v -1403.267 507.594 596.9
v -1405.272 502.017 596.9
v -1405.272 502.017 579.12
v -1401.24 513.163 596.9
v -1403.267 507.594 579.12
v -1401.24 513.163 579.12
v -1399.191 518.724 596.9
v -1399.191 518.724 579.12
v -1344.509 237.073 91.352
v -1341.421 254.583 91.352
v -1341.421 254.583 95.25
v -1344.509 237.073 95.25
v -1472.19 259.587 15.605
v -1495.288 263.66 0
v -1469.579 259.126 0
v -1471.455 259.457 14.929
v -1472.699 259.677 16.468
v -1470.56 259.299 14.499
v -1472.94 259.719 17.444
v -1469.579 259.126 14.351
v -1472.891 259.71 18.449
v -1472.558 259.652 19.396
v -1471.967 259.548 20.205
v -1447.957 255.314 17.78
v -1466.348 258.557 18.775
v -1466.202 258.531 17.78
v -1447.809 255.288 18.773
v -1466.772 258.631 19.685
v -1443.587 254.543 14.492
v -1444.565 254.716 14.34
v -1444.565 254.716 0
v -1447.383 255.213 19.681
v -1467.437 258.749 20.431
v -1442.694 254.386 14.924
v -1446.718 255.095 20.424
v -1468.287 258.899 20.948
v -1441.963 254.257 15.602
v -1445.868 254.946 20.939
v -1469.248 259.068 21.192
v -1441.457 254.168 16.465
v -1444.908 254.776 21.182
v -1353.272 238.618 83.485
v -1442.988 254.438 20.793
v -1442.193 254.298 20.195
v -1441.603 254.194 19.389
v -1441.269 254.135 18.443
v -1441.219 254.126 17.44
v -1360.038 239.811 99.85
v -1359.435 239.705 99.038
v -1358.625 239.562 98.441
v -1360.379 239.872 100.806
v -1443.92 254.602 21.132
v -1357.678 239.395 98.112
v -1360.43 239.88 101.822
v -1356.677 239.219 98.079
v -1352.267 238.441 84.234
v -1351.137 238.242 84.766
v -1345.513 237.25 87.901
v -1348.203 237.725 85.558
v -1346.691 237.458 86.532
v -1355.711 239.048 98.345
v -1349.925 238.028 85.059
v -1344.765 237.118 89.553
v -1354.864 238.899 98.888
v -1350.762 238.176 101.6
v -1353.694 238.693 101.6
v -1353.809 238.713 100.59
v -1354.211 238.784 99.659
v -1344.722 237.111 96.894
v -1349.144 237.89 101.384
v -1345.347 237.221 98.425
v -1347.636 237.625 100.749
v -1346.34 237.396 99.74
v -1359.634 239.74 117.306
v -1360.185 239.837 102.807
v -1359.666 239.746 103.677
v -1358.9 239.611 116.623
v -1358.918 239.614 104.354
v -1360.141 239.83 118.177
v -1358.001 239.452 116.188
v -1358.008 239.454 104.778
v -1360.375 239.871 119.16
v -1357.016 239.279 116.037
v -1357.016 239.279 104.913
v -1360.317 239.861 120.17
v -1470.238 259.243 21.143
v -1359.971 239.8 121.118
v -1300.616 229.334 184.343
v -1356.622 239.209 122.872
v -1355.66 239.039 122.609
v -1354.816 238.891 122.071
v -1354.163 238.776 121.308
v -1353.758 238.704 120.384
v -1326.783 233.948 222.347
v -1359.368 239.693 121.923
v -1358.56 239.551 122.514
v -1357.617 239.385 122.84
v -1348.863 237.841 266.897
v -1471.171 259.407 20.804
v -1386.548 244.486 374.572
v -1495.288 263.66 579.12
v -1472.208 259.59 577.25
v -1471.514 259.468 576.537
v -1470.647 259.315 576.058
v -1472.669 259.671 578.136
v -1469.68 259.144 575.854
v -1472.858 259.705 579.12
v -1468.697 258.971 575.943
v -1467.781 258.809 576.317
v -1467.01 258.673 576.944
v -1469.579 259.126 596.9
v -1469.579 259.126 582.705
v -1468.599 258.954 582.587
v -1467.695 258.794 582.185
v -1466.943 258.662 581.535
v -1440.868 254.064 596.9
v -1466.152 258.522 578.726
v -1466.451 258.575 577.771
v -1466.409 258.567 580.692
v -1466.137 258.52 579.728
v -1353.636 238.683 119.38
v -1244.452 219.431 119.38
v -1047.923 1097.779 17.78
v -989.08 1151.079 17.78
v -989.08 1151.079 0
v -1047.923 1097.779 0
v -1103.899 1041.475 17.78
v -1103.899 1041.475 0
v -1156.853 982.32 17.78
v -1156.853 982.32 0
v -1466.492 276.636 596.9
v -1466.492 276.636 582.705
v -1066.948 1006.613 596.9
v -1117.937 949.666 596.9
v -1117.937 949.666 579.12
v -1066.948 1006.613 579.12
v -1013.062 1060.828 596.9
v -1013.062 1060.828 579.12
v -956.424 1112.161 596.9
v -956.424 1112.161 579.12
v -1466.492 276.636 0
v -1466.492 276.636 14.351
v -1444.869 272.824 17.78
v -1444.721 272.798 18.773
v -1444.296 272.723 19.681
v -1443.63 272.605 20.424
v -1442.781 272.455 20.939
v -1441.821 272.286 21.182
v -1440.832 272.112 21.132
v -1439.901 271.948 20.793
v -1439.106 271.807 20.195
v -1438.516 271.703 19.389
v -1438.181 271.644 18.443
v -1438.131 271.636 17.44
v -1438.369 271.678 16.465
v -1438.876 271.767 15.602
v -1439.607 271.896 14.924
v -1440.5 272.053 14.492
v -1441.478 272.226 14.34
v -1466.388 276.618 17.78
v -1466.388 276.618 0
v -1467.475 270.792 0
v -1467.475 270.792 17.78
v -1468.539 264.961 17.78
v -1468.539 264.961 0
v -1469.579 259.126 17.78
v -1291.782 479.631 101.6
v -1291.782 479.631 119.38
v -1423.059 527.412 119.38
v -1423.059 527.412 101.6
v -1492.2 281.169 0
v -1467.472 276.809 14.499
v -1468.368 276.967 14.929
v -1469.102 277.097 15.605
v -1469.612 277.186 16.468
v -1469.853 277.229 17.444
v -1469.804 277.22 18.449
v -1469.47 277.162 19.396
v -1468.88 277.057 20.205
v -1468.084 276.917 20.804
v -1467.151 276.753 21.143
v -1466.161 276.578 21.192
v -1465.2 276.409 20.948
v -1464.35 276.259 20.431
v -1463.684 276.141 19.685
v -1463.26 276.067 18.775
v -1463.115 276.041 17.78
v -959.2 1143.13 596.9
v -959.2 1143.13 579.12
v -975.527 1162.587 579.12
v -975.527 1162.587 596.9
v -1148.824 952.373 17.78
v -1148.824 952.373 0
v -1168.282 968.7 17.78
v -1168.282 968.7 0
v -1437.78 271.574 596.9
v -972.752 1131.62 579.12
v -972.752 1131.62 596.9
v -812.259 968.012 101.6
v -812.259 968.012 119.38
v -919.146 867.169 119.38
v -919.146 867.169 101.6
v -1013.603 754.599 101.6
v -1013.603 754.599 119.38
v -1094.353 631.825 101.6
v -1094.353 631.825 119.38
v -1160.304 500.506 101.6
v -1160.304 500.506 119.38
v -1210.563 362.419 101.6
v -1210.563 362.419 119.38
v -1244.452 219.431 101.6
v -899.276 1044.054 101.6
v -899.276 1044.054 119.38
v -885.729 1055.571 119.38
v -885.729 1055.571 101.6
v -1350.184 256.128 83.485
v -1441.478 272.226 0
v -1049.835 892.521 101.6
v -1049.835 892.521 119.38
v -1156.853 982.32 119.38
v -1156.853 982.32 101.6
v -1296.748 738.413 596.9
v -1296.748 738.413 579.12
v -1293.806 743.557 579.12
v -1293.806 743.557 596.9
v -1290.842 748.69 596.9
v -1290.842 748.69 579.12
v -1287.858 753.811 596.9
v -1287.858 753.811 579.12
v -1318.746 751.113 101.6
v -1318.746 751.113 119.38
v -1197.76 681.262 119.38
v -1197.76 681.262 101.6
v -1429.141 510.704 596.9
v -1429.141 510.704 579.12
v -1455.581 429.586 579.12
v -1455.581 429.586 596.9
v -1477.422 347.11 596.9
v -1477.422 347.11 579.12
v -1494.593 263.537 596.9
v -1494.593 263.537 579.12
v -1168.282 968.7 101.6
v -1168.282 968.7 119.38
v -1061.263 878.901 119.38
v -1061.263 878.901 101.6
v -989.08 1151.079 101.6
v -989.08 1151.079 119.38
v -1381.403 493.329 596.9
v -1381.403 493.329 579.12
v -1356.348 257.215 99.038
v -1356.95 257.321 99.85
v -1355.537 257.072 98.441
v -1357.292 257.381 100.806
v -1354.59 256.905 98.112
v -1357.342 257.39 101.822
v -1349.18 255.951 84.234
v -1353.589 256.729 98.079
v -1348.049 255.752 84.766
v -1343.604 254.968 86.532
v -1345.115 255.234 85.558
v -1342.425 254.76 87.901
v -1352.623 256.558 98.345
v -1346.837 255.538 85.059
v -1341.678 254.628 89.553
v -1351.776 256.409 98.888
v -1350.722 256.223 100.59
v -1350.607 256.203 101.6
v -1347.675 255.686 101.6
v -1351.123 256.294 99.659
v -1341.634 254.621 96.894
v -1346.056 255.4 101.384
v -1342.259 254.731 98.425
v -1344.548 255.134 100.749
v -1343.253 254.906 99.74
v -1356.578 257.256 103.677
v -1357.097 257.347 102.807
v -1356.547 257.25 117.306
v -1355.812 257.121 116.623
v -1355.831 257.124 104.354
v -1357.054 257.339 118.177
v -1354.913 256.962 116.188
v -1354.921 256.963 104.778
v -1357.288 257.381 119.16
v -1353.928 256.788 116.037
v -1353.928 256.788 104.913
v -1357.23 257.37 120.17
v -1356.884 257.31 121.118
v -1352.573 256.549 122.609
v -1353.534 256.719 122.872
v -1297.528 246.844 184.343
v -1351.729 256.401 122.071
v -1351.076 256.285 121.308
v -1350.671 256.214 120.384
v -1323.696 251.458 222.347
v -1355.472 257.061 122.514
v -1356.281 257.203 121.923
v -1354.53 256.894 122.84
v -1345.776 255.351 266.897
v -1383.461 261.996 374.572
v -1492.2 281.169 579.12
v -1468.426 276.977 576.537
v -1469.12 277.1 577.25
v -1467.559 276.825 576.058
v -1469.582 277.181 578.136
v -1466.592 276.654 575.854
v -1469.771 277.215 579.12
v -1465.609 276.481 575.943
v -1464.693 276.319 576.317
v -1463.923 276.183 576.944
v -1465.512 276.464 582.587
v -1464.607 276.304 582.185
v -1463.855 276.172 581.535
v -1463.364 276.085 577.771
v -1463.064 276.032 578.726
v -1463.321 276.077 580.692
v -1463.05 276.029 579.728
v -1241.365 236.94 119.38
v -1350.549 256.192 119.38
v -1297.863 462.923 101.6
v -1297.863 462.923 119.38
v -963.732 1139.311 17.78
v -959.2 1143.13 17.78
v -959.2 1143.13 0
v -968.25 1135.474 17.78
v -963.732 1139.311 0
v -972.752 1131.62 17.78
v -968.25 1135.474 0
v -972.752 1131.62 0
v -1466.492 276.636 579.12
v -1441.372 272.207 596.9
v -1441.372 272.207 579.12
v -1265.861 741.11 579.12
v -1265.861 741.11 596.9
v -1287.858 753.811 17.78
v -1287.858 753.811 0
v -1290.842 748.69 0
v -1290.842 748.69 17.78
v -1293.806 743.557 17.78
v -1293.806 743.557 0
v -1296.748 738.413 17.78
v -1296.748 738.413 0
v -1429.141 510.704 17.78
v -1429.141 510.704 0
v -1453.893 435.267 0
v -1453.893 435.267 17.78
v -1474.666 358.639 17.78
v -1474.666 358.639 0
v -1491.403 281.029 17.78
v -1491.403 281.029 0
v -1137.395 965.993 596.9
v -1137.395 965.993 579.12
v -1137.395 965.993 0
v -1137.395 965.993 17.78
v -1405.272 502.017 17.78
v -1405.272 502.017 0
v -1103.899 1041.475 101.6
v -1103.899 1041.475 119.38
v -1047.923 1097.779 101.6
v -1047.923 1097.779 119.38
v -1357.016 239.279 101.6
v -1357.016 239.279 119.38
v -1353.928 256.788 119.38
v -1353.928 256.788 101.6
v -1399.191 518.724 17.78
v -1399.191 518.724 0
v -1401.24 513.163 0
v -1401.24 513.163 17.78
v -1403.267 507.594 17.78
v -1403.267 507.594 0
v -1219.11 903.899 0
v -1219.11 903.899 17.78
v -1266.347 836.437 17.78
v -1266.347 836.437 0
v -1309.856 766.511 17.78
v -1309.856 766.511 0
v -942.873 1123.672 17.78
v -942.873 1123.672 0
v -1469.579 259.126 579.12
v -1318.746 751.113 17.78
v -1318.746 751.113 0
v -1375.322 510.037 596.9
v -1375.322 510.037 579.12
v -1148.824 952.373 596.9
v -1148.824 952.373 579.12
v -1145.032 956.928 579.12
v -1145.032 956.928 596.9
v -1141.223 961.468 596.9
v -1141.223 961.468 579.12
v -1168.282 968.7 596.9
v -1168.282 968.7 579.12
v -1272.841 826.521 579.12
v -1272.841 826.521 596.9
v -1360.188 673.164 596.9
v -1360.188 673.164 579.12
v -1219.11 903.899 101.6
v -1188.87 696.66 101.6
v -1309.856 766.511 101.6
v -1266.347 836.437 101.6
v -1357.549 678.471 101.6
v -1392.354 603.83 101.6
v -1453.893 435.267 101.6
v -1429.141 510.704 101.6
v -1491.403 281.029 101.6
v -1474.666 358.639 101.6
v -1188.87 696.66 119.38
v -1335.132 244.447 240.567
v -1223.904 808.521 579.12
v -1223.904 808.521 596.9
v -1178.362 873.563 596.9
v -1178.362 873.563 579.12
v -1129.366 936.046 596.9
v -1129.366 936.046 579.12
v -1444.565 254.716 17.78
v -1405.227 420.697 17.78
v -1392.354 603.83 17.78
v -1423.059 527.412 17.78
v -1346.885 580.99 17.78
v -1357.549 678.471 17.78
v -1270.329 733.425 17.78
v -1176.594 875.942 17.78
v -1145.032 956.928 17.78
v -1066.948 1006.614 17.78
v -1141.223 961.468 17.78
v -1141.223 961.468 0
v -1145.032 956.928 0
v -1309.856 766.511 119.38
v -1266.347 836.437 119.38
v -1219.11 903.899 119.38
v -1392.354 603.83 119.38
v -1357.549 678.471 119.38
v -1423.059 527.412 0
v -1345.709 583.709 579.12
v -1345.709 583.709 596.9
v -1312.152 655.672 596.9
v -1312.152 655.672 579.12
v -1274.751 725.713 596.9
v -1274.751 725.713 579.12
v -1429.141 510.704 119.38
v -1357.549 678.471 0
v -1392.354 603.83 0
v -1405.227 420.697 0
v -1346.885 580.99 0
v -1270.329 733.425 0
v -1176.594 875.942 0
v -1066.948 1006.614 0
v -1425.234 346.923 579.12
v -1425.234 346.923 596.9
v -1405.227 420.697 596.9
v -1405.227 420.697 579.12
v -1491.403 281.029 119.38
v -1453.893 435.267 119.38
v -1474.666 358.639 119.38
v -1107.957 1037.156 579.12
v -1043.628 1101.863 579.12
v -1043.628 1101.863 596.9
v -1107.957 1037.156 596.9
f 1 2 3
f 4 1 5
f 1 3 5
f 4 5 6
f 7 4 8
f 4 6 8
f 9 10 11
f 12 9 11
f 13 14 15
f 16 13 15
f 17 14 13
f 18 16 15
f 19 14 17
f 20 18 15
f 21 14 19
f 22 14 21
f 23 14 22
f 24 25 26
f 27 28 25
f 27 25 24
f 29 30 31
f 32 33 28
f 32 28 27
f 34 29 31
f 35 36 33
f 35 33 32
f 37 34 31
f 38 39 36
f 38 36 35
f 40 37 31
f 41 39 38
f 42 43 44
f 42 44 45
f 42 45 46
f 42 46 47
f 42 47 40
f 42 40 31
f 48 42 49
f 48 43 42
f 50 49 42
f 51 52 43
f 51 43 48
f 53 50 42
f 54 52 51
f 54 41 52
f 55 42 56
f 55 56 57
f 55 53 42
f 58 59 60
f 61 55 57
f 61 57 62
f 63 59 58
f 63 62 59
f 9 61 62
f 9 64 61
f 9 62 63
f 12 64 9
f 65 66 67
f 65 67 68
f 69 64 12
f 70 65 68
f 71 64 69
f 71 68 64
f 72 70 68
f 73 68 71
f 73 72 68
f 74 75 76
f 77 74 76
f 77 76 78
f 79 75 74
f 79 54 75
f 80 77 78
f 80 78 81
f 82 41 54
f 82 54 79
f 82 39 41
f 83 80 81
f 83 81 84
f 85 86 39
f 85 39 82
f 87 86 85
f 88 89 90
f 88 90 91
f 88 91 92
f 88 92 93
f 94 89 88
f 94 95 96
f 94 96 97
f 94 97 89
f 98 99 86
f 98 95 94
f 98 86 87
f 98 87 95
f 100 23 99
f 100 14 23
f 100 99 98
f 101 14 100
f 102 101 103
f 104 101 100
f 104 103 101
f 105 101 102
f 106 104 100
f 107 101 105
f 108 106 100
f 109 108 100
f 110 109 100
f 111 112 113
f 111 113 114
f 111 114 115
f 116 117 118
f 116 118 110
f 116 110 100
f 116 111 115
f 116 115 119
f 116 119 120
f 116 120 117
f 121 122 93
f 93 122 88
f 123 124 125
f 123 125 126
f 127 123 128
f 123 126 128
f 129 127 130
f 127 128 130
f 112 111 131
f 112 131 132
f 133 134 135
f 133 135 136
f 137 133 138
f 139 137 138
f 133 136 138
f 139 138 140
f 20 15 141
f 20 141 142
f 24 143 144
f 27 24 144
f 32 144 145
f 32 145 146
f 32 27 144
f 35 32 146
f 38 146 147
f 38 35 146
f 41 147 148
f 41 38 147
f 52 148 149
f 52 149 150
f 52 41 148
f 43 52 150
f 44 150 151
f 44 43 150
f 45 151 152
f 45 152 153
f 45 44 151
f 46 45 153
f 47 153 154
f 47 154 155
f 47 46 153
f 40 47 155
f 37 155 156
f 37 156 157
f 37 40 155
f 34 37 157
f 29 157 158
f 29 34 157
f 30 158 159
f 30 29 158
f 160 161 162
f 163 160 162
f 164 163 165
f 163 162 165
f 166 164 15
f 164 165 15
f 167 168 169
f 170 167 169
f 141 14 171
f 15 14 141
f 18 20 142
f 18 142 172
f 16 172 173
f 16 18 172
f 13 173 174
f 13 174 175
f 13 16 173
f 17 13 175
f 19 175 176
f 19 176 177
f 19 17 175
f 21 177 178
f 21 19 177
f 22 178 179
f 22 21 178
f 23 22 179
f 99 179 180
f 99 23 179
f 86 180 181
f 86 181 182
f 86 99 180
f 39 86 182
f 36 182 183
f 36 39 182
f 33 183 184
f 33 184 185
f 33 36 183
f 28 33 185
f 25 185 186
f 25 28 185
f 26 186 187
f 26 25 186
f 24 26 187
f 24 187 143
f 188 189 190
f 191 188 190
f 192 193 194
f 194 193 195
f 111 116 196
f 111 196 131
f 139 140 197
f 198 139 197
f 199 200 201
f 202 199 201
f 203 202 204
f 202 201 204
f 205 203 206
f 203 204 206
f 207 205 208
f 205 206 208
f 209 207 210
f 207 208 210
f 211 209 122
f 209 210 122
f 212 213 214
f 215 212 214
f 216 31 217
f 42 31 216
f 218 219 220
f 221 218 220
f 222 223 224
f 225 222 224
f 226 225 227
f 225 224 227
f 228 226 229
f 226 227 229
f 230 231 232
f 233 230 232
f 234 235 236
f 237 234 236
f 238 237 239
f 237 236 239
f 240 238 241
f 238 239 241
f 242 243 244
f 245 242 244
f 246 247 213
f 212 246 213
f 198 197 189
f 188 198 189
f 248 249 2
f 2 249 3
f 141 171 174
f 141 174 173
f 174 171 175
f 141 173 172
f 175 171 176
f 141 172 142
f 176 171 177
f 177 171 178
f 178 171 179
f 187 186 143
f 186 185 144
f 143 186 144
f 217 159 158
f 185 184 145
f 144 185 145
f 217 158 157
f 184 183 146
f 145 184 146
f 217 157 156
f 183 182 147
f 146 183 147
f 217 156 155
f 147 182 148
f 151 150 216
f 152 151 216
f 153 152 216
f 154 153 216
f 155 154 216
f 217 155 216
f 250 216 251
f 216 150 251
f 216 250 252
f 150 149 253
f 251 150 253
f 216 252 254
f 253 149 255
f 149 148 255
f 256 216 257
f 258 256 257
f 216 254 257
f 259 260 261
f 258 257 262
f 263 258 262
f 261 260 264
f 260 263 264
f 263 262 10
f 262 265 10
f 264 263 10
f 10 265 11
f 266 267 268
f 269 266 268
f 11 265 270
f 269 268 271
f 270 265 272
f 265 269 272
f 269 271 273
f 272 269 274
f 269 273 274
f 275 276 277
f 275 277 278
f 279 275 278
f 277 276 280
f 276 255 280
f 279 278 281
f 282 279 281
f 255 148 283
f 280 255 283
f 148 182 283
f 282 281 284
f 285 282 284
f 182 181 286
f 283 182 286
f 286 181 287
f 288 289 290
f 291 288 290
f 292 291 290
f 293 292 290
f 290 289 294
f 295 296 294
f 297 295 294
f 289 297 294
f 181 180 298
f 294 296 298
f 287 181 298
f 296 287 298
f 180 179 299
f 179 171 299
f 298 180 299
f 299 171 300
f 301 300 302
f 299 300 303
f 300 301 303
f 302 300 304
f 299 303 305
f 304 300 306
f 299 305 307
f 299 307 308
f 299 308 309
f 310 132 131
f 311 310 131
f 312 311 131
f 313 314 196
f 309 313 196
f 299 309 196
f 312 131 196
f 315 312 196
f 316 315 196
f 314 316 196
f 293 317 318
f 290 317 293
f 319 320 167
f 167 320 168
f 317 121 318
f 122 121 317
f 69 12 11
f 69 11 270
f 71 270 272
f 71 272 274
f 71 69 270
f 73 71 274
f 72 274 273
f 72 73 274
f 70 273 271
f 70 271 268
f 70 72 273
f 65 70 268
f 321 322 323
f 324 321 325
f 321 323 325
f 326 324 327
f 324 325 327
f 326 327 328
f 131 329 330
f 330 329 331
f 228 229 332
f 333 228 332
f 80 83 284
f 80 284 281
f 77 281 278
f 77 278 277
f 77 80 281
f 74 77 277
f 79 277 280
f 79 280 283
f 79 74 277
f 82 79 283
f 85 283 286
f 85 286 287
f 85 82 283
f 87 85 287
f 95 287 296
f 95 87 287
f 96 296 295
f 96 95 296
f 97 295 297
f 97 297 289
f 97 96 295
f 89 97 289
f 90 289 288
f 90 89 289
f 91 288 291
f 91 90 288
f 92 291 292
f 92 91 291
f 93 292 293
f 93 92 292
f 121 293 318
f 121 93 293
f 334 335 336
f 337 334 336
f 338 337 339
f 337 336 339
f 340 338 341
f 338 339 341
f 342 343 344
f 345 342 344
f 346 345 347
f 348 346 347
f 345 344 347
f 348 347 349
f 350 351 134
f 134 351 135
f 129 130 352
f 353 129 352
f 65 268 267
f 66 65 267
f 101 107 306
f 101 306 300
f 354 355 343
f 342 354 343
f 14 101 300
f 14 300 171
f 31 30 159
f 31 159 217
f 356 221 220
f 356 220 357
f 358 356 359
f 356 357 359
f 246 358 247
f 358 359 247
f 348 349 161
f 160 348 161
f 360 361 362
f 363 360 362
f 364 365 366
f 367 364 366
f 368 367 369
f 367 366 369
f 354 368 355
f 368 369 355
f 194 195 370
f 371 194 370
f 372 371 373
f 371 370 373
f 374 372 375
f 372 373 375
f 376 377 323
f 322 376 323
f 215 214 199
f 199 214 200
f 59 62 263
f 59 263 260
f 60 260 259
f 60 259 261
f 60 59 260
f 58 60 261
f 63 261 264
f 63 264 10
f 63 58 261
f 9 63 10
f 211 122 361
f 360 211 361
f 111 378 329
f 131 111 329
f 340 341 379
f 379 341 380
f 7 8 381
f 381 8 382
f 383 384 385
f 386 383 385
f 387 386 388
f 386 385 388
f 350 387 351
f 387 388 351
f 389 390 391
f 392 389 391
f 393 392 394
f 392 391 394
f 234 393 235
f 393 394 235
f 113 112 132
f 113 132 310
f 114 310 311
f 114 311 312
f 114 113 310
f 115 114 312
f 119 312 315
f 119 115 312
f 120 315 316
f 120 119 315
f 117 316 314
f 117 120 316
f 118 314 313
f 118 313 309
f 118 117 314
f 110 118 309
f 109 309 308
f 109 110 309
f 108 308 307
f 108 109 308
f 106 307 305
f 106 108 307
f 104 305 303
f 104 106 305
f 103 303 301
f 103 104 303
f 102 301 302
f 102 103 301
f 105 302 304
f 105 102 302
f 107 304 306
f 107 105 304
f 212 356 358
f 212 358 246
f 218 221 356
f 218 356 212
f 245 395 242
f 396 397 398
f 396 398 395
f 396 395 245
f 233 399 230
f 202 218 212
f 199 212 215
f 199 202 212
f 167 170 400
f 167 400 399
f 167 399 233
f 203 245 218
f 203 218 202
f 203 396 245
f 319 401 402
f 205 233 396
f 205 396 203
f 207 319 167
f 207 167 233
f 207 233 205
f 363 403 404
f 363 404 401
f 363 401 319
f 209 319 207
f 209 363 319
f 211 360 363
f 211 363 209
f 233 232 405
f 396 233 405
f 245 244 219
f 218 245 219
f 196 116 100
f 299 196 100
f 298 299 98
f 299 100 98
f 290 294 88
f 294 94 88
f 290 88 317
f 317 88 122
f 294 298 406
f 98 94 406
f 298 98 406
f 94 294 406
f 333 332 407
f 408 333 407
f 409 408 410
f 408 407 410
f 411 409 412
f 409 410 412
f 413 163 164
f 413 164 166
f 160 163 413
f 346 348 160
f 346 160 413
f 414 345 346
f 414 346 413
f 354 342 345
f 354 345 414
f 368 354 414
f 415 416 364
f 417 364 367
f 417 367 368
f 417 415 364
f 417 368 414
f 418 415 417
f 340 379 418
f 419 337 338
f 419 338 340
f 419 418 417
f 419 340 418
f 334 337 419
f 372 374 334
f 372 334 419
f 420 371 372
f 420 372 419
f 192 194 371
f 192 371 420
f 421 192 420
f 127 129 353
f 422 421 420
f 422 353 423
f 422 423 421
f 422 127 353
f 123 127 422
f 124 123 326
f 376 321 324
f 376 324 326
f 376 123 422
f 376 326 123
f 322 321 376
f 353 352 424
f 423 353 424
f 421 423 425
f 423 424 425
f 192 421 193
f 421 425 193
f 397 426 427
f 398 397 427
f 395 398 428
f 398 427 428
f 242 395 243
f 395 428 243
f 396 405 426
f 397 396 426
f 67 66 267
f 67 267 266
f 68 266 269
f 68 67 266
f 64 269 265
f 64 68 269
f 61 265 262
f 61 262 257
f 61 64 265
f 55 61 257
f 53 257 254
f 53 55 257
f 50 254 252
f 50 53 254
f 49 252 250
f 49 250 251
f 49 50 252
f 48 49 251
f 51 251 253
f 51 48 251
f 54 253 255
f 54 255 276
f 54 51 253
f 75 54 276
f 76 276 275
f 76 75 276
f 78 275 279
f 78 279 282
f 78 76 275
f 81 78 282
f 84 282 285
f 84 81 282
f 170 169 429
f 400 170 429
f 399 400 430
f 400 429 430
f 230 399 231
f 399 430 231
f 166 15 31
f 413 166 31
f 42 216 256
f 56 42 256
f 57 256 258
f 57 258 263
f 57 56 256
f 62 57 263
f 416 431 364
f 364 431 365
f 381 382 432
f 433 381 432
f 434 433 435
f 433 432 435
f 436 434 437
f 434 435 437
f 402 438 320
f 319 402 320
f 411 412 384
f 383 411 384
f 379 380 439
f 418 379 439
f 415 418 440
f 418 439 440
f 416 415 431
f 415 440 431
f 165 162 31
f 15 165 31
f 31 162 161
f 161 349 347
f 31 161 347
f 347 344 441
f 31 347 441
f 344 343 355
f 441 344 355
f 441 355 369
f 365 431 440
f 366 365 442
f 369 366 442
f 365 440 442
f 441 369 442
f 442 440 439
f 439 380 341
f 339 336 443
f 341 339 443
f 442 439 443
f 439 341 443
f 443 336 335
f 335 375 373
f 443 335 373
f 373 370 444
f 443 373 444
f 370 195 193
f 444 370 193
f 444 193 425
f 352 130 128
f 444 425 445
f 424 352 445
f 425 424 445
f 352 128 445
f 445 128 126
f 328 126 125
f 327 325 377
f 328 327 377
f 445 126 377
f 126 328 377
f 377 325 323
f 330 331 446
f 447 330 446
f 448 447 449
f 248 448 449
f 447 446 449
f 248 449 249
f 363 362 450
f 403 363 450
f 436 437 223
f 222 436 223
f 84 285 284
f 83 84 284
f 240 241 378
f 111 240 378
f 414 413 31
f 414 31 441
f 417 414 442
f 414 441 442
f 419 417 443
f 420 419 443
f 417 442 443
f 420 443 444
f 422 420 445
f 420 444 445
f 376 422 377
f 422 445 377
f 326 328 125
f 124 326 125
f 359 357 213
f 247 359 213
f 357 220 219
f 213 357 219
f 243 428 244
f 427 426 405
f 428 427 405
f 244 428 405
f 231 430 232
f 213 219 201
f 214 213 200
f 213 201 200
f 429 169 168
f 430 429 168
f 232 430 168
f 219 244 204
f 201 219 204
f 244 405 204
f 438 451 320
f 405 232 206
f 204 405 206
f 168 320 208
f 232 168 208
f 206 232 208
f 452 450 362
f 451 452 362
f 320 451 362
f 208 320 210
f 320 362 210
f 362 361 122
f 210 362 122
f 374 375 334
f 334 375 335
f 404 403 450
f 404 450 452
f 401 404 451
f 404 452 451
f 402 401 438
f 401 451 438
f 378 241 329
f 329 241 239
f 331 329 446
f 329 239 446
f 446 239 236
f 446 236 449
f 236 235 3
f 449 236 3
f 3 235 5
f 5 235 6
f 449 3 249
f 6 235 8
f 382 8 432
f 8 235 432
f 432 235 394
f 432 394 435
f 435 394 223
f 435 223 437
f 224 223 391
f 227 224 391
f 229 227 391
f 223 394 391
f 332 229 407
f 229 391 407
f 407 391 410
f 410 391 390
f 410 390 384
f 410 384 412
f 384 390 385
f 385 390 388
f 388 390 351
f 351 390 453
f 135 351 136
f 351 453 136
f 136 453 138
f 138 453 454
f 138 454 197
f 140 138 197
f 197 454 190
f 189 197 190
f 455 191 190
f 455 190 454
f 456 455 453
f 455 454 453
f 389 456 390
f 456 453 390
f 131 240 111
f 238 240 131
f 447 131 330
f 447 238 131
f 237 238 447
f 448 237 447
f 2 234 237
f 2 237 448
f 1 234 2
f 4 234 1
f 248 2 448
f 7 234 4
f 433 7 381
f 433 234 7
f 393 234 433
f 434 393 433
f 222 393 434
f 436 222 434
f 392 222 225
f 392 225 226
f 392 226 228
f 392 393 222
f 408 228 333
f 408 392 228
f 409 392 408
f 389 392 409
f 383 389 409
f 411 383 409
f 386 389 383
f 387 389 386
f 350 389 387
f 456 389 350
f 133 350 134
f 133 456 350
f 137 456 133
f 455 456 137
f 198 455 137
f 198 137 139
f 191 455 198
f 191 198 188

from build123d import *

# Parameters (mm, degrees)
F1_DEPTH = 17.78
F3_DEPTH = 17.78
F5_DEPTH = 17.78
F8_DEPTH = 17.78


with BuildPart() as f1:
    # F0 (on Top) → F1 (new body)
    with BuildSketch(Plane.XY):
        with BuildLine():
            Line((-942.8730052687, 1123.6722913891), (-959.1998105547, 1143.1298202443))
            ThreePointArc((-959.1998105547, 1143.1298202443), (-965.9930441933, 1137.395050574), (-972.7519920849, 1131.6199116288))
            Line((-972.7519920849, 1131.6199116288), (-989.0799370092, 1151.0787986519))
            ThreePointArc((-989.0799370092, 1151.0787986519), (-1076.2792142324, 1069.9927922707), (-1156.8530210759, 982.3200141133))
            Line((-1156.8530210759, 982.3200141133), (-1137.3951527054, 965.9929239401))
            ThreePointArc((-1137.3951527054, 965.9929239401), (-1143.1298202443, 959.1998105547), (-1148.8239164056, 952.3726537414))
            Line((-1148.8239164056, 952.3726537414), (-1168.2817847761, 968.6997439146))
            ThreePointArc((-1168.2817847761, 968.6997439146), (-1243.1861000152, 870.4882786282), (-1309.8559045877, 766.5109468995))
            Line((-1309.8559045877, 766.5109468995), (-1287.8584755041, 753.8107252966))
            ThreePointArc((-1287.8584755041, 753.8107252966), (-1292.3264087973, 746.125), (-1296.7484755041, 738.4127936173))
            Line((-1296.7484755041, 738.4127936173), (-1318.7459045877, 751.1130152202))
            ThreePointArc((-1318.7459045877, 751.1130152202), (-1375.4580129962, 641.3866049308), (-1423.0594792576, 527.4118324374))
            Line((-1423.0594792576, 527.4118324374), (-1399.1908702125, 518.7243692117))
            ThreePointArc((-1399.1908702125, 518.7243692117), (-1402.2563133678, 510.3795588777), (-1405.2719883608, 502.0166344141))
            Line((-1405.2719883608, 502.0166344141), (-1429.140597406, 510.7040976399))
            ThreePointArc((-1429.140597406, 510.7040976399), (-1464.7805470889, 397.088744955), (-1491.4034498948, 281.0289524975))
            Line((-1491.4034498948, 281.0289524975), (-1466.3875869413, 276.6179809131))
            ThreePointArc((-1466.3875869413, 276.6179809131), (-1468.0095300324, 267.8769908634), (-1469.5793694325, 259.1264931235))
            Line((-1469.5793694325, 259.1264931235), (-1444.565252506, 254.7158294107))
            ThreePointArc((-1444.565252506, 254.7158294107), (-1270.3293635412, 733.425), (-942.8730052687, 1123.6722913891))
        make_face()
    extrude(amount=F1_DEPTH)


with BuildPart() as f3:
    # F2 (on face) → F3 (new body)
    with BuildSketch(Plane(origin=(0, 0, 0), x_dir=(0.984807753, -0.1736481777, 0), z_dir=(-0.1736481777, -0.984807753, 0))):
        with BuildLine():
            Line((-1518.3551311493, 0), (-1492.25, 0))
            Line((-1492.25, 0), (-1492.25, 14.351))
            ThreePointArc((-1492.25, 14.351), (-1494.6746691527, 20.2046691527), (-1488.821, 17.78))
            Line((-1488.821, 17.78), (-1470.2938070244, 17.78))
            ThreePointArc((-1470.2938070244, 17.78), (-1464.4415489784, 20.1951790962), (-1466.85, 14.3401489527))
            Line((-1466.85, 14.3401489527), (-1466.85, 0))
            Line((-1466.85, 0), (-1374.1479773797, 83.4850971333))
            ThreePointArc((-1374.1479773797, 83.4850971333), (-1372.5673341992, 84.5284814934), (-1370.7492766555, 85.0592832973))
            ThreePointArc((-1370.7492766555, 85.0592832973), (-1366.8185465998, 87.1734978195), (-1365.25, 91.3520386391))
            Line((-1365.25, 91.3520386391), (-1365.25, 95.25))
            ThreePointArc((-1365.25, 95.25), (-1367.1098719395, 99.7401280605), (-1371.6, 101.6))
            Line((-1371.6, 101.6), (-1374.5770201141, 101.6))
            ThreePointArc((-1374.5770201141, 101.6), (-1380.4069192448, 99.0381939532), (-1377.95, 104.9130660301))
            Line((-1377.95, 104.9130660301), (-1377.95, 116.0374188485))
            ThreePointArc((-1377.95, 116.0374188485), (-1380.3385150421, 121.9228376163), (-1374.5181082663, 119.38))
            Line((-1374.5181082663, 119.38), (-1263.6500000001, 119.38))
            add(Edge.make_bspline(
                [(-1463.0953241153, 596.9), (-1435.2213655624, 463.1560709507), (-1371.53772684, 219.6405486266), (-1300.5032324543, 163.3910187016), (-1263.6500000001, 119.38)],
                knots=[0.0910439939, 0.0910439939, 0.0910439939, 0.0910439939, 0.6287928425, 1, 1, 1, 1], degree=3))
            Line((-1463.0953241153, 596.9), (-1492.25, 596.9))
            Line((-1492.25, 596.9), (-1492.25, 582.7054097958))
            ThreePointArc((-1492.25, 582.7054097958), (-1489.6412751046, 576.9444635359), (-1495.5793714733, 579.12))
            Line((-1495.5793714733, 579.12), (-1518.3551311493, 579.12))
            Line((-1518.3551311493, 579.12), (-1518.3551311493, 0))
        make_face()
    extrude(amount=-F3_DEPTH)


with BuildPart() as f5:
    # F4 (on face) → F5 (new body)
    with BuildSketch(Plane.XY.offset(579.12)):
        with BuildLine():
            ThreePointArc((-1168.2817847761, 968.6997439146), (-1243.1861000152, 870.4882786282), (-1309.8559045877, 766.5109468995))
            ThreePointArc((-1309.8559045877, 766.5109468995), (-1375.4580129962, 641.3866049308), (-1429.140597406, 510.7040976399))
            ThreePointArc((-1429.140597406, 510.7040976399), (-1467.0814981789, 388.5014803077), (-1494.593486359, 263.5371568362))
            Line((-1494.593486359, 263.5371568362), (-1469.5793694325, 259.1264931235))
            Line((-1469.5793694325, 259.1264931235), (-1466.4919048335, 276.636374972))
            Line((-1466.4919048335, 276.636374972), (-1441.3716635128, 272.2069986653))
            ThreePointArc((-1441.3716635128, 272.2069986653), (-1415.7112941773, 383.940690783), (-1381.4033648918, 493.3291659385))
            Line((-1381.4033648918, 493.3291659385), (-1405.2719883608, 502.0166344141))
            ThreePointArc((-1405.2719883608, 502.0166344141), (-1402.2563133678, 510.3795588777), (-1399.1908702125, 518.7243692117))
            Line((-1399.1908702125, 518.7243692117), (-1375.3222467435, 510.0369007361))
            ThreePointArc((-1375.3222467435, 510.0369007361), (-1329.4175774147, 619.9175972343), (-1274.7510331275, 725.7125643397))
            Line((-1274.7510331275, 725.7125643397), (-1296.7484755041, 738.4127936173))
            ThreePointArc((-1296.7484755041, 738.4127936173), (-1292.3264087973, 746.125), (-1287.8584755041, 753.8107252966))
            Line((-1287.8584755041, 753.8107252966), (-1265.8610331275, 741.110496019))
            ThreePointArc((-1265.8610331275, 741.110496019), (-1201.5731761653, 841.3505956615), (-1129.3660362767, 936.0455537017))
            Line((-1129.3660362767, 936.0455537017), (-1148.8239164056, 952.3726537414))
            ThreePointArc((-1148.8239164056, 952.3726537414), (-1143.1298202443, 959.1998105547), (-1137.3951527054, 965.9929239401))
            Line((-1137.3951527054, 965.9929239401), (-1117.9372725764, 949.6658239004))
            ThreePointArc((-1117.9372725764, 949.6658239004), (-1040.3580388533, 1034.0715997906), (-956.4240076884, 1112.1609775645))
            Line((-956.4240076884, 1112.1609775645), (-972.7519920849, 1131.6199116288))
            Line((-972.7519920849, 1131.6199116288), (-959.1998105547, 1143.1298202443))
            Line((-959.1998105547, 1143.1298202443), (-975.5266158408, 1162.5873490995))
            ThreePointArc((-975.5266158408, 1162.5873490995), (-1076.2791066912, 1069.9929004437), (-1168.2817847761, 968.6997439146))
        make_face()
    extrude(amount=F5_DEPTH)


with BuildPart() as f8:
    # F7 (on face) → F8 (new body)
    with BuildSketch(Plane(origin=(0, 0, 119.38), x_dir=(1, 0, 0), z_dir=(0, 0, -1))):
        with BuildLine():
            Line((-1357.0158432632, -239.2785064161), (-1353.9283786643, -256.7883882647))
            Line((-1353.9283786643, -256.7883882647), (-1491.4034498948, -281.0289524975))
            ThreePointArc((-1491.4034498948, -281.0289524975), (-1464.7805470889, -397.088744955), (-1429.140597406, -510.7040976399))
            Line((-1429.140597406, -510.7040976399), (-1297.8630576463, -462.9229807397))
            Line((-1297.8630576463, -462.9229807397), (-1291.781939498, -479.6307155373))
            Line((-1291.781939498, -479.6307155373), (-1423.0594792576, -527.4118324374))
            ThreePointArc((-1423.0594792576, -527.4118324374), (-1375.4580129962, -641.3866049308), (-1318.7459045877, -751.1130152202))
            Line((-1318.7459045877, -751.1130152202), (-1197.7598695127, -681.2616953015))
            Line((-1197.7598695127, -681.2616953015), (-1188.8698695127, -696.6596269808))
            Line((-1188.8698695127, -696.6596269808), (-1309.8559045877, -766.5109468995))
            ThreePointArc((-1309.8559045877, -766.5109468995), (-1243.1861000152, -870.4882786282), (-1168.2817847761, -968.6997439146))
            Line((-1168.2817847761, -968.6997439146), (-1061.2633538396, -878.9006179866))
            Line((-1061.2633538396, -878.9006179866), (-1049.8345901393, -892.5208881852))
            Line((-1049.8345901393, -892.5208881852), (-1156.8530210759, -982.3200141133))
            ThreePointArc((-1156.8530210759, -982.3200141133), (-1076.2792142324, -1069.9927922707), (-989.0799370092, -1151.0787986519))
            Line((-989.0799370092, -1151.0787986519), (-899.2757199376, -1044.0543003268))
            Line((-899.2757199376, -1044.0543003268), (-885.7291867676, -1055.5709403958))
            Line((-885.7291867676, -1055.5709403958), (-812.2585629805, -968.0120605474))
            ThreePointArc((-812.2585629805, -968.0120605474), (-1094.3530014923, -631.825), (-1244.452317094, -219.4305197088))
            Line((-1244.452317094, -219.4305197088), (-1357.0158432632, -239.2785064161))
        make_face()
    extrude(amount=F8_DEPTH)


solid = Compound([f1.part, f3.part, f5.part, f8.part])
